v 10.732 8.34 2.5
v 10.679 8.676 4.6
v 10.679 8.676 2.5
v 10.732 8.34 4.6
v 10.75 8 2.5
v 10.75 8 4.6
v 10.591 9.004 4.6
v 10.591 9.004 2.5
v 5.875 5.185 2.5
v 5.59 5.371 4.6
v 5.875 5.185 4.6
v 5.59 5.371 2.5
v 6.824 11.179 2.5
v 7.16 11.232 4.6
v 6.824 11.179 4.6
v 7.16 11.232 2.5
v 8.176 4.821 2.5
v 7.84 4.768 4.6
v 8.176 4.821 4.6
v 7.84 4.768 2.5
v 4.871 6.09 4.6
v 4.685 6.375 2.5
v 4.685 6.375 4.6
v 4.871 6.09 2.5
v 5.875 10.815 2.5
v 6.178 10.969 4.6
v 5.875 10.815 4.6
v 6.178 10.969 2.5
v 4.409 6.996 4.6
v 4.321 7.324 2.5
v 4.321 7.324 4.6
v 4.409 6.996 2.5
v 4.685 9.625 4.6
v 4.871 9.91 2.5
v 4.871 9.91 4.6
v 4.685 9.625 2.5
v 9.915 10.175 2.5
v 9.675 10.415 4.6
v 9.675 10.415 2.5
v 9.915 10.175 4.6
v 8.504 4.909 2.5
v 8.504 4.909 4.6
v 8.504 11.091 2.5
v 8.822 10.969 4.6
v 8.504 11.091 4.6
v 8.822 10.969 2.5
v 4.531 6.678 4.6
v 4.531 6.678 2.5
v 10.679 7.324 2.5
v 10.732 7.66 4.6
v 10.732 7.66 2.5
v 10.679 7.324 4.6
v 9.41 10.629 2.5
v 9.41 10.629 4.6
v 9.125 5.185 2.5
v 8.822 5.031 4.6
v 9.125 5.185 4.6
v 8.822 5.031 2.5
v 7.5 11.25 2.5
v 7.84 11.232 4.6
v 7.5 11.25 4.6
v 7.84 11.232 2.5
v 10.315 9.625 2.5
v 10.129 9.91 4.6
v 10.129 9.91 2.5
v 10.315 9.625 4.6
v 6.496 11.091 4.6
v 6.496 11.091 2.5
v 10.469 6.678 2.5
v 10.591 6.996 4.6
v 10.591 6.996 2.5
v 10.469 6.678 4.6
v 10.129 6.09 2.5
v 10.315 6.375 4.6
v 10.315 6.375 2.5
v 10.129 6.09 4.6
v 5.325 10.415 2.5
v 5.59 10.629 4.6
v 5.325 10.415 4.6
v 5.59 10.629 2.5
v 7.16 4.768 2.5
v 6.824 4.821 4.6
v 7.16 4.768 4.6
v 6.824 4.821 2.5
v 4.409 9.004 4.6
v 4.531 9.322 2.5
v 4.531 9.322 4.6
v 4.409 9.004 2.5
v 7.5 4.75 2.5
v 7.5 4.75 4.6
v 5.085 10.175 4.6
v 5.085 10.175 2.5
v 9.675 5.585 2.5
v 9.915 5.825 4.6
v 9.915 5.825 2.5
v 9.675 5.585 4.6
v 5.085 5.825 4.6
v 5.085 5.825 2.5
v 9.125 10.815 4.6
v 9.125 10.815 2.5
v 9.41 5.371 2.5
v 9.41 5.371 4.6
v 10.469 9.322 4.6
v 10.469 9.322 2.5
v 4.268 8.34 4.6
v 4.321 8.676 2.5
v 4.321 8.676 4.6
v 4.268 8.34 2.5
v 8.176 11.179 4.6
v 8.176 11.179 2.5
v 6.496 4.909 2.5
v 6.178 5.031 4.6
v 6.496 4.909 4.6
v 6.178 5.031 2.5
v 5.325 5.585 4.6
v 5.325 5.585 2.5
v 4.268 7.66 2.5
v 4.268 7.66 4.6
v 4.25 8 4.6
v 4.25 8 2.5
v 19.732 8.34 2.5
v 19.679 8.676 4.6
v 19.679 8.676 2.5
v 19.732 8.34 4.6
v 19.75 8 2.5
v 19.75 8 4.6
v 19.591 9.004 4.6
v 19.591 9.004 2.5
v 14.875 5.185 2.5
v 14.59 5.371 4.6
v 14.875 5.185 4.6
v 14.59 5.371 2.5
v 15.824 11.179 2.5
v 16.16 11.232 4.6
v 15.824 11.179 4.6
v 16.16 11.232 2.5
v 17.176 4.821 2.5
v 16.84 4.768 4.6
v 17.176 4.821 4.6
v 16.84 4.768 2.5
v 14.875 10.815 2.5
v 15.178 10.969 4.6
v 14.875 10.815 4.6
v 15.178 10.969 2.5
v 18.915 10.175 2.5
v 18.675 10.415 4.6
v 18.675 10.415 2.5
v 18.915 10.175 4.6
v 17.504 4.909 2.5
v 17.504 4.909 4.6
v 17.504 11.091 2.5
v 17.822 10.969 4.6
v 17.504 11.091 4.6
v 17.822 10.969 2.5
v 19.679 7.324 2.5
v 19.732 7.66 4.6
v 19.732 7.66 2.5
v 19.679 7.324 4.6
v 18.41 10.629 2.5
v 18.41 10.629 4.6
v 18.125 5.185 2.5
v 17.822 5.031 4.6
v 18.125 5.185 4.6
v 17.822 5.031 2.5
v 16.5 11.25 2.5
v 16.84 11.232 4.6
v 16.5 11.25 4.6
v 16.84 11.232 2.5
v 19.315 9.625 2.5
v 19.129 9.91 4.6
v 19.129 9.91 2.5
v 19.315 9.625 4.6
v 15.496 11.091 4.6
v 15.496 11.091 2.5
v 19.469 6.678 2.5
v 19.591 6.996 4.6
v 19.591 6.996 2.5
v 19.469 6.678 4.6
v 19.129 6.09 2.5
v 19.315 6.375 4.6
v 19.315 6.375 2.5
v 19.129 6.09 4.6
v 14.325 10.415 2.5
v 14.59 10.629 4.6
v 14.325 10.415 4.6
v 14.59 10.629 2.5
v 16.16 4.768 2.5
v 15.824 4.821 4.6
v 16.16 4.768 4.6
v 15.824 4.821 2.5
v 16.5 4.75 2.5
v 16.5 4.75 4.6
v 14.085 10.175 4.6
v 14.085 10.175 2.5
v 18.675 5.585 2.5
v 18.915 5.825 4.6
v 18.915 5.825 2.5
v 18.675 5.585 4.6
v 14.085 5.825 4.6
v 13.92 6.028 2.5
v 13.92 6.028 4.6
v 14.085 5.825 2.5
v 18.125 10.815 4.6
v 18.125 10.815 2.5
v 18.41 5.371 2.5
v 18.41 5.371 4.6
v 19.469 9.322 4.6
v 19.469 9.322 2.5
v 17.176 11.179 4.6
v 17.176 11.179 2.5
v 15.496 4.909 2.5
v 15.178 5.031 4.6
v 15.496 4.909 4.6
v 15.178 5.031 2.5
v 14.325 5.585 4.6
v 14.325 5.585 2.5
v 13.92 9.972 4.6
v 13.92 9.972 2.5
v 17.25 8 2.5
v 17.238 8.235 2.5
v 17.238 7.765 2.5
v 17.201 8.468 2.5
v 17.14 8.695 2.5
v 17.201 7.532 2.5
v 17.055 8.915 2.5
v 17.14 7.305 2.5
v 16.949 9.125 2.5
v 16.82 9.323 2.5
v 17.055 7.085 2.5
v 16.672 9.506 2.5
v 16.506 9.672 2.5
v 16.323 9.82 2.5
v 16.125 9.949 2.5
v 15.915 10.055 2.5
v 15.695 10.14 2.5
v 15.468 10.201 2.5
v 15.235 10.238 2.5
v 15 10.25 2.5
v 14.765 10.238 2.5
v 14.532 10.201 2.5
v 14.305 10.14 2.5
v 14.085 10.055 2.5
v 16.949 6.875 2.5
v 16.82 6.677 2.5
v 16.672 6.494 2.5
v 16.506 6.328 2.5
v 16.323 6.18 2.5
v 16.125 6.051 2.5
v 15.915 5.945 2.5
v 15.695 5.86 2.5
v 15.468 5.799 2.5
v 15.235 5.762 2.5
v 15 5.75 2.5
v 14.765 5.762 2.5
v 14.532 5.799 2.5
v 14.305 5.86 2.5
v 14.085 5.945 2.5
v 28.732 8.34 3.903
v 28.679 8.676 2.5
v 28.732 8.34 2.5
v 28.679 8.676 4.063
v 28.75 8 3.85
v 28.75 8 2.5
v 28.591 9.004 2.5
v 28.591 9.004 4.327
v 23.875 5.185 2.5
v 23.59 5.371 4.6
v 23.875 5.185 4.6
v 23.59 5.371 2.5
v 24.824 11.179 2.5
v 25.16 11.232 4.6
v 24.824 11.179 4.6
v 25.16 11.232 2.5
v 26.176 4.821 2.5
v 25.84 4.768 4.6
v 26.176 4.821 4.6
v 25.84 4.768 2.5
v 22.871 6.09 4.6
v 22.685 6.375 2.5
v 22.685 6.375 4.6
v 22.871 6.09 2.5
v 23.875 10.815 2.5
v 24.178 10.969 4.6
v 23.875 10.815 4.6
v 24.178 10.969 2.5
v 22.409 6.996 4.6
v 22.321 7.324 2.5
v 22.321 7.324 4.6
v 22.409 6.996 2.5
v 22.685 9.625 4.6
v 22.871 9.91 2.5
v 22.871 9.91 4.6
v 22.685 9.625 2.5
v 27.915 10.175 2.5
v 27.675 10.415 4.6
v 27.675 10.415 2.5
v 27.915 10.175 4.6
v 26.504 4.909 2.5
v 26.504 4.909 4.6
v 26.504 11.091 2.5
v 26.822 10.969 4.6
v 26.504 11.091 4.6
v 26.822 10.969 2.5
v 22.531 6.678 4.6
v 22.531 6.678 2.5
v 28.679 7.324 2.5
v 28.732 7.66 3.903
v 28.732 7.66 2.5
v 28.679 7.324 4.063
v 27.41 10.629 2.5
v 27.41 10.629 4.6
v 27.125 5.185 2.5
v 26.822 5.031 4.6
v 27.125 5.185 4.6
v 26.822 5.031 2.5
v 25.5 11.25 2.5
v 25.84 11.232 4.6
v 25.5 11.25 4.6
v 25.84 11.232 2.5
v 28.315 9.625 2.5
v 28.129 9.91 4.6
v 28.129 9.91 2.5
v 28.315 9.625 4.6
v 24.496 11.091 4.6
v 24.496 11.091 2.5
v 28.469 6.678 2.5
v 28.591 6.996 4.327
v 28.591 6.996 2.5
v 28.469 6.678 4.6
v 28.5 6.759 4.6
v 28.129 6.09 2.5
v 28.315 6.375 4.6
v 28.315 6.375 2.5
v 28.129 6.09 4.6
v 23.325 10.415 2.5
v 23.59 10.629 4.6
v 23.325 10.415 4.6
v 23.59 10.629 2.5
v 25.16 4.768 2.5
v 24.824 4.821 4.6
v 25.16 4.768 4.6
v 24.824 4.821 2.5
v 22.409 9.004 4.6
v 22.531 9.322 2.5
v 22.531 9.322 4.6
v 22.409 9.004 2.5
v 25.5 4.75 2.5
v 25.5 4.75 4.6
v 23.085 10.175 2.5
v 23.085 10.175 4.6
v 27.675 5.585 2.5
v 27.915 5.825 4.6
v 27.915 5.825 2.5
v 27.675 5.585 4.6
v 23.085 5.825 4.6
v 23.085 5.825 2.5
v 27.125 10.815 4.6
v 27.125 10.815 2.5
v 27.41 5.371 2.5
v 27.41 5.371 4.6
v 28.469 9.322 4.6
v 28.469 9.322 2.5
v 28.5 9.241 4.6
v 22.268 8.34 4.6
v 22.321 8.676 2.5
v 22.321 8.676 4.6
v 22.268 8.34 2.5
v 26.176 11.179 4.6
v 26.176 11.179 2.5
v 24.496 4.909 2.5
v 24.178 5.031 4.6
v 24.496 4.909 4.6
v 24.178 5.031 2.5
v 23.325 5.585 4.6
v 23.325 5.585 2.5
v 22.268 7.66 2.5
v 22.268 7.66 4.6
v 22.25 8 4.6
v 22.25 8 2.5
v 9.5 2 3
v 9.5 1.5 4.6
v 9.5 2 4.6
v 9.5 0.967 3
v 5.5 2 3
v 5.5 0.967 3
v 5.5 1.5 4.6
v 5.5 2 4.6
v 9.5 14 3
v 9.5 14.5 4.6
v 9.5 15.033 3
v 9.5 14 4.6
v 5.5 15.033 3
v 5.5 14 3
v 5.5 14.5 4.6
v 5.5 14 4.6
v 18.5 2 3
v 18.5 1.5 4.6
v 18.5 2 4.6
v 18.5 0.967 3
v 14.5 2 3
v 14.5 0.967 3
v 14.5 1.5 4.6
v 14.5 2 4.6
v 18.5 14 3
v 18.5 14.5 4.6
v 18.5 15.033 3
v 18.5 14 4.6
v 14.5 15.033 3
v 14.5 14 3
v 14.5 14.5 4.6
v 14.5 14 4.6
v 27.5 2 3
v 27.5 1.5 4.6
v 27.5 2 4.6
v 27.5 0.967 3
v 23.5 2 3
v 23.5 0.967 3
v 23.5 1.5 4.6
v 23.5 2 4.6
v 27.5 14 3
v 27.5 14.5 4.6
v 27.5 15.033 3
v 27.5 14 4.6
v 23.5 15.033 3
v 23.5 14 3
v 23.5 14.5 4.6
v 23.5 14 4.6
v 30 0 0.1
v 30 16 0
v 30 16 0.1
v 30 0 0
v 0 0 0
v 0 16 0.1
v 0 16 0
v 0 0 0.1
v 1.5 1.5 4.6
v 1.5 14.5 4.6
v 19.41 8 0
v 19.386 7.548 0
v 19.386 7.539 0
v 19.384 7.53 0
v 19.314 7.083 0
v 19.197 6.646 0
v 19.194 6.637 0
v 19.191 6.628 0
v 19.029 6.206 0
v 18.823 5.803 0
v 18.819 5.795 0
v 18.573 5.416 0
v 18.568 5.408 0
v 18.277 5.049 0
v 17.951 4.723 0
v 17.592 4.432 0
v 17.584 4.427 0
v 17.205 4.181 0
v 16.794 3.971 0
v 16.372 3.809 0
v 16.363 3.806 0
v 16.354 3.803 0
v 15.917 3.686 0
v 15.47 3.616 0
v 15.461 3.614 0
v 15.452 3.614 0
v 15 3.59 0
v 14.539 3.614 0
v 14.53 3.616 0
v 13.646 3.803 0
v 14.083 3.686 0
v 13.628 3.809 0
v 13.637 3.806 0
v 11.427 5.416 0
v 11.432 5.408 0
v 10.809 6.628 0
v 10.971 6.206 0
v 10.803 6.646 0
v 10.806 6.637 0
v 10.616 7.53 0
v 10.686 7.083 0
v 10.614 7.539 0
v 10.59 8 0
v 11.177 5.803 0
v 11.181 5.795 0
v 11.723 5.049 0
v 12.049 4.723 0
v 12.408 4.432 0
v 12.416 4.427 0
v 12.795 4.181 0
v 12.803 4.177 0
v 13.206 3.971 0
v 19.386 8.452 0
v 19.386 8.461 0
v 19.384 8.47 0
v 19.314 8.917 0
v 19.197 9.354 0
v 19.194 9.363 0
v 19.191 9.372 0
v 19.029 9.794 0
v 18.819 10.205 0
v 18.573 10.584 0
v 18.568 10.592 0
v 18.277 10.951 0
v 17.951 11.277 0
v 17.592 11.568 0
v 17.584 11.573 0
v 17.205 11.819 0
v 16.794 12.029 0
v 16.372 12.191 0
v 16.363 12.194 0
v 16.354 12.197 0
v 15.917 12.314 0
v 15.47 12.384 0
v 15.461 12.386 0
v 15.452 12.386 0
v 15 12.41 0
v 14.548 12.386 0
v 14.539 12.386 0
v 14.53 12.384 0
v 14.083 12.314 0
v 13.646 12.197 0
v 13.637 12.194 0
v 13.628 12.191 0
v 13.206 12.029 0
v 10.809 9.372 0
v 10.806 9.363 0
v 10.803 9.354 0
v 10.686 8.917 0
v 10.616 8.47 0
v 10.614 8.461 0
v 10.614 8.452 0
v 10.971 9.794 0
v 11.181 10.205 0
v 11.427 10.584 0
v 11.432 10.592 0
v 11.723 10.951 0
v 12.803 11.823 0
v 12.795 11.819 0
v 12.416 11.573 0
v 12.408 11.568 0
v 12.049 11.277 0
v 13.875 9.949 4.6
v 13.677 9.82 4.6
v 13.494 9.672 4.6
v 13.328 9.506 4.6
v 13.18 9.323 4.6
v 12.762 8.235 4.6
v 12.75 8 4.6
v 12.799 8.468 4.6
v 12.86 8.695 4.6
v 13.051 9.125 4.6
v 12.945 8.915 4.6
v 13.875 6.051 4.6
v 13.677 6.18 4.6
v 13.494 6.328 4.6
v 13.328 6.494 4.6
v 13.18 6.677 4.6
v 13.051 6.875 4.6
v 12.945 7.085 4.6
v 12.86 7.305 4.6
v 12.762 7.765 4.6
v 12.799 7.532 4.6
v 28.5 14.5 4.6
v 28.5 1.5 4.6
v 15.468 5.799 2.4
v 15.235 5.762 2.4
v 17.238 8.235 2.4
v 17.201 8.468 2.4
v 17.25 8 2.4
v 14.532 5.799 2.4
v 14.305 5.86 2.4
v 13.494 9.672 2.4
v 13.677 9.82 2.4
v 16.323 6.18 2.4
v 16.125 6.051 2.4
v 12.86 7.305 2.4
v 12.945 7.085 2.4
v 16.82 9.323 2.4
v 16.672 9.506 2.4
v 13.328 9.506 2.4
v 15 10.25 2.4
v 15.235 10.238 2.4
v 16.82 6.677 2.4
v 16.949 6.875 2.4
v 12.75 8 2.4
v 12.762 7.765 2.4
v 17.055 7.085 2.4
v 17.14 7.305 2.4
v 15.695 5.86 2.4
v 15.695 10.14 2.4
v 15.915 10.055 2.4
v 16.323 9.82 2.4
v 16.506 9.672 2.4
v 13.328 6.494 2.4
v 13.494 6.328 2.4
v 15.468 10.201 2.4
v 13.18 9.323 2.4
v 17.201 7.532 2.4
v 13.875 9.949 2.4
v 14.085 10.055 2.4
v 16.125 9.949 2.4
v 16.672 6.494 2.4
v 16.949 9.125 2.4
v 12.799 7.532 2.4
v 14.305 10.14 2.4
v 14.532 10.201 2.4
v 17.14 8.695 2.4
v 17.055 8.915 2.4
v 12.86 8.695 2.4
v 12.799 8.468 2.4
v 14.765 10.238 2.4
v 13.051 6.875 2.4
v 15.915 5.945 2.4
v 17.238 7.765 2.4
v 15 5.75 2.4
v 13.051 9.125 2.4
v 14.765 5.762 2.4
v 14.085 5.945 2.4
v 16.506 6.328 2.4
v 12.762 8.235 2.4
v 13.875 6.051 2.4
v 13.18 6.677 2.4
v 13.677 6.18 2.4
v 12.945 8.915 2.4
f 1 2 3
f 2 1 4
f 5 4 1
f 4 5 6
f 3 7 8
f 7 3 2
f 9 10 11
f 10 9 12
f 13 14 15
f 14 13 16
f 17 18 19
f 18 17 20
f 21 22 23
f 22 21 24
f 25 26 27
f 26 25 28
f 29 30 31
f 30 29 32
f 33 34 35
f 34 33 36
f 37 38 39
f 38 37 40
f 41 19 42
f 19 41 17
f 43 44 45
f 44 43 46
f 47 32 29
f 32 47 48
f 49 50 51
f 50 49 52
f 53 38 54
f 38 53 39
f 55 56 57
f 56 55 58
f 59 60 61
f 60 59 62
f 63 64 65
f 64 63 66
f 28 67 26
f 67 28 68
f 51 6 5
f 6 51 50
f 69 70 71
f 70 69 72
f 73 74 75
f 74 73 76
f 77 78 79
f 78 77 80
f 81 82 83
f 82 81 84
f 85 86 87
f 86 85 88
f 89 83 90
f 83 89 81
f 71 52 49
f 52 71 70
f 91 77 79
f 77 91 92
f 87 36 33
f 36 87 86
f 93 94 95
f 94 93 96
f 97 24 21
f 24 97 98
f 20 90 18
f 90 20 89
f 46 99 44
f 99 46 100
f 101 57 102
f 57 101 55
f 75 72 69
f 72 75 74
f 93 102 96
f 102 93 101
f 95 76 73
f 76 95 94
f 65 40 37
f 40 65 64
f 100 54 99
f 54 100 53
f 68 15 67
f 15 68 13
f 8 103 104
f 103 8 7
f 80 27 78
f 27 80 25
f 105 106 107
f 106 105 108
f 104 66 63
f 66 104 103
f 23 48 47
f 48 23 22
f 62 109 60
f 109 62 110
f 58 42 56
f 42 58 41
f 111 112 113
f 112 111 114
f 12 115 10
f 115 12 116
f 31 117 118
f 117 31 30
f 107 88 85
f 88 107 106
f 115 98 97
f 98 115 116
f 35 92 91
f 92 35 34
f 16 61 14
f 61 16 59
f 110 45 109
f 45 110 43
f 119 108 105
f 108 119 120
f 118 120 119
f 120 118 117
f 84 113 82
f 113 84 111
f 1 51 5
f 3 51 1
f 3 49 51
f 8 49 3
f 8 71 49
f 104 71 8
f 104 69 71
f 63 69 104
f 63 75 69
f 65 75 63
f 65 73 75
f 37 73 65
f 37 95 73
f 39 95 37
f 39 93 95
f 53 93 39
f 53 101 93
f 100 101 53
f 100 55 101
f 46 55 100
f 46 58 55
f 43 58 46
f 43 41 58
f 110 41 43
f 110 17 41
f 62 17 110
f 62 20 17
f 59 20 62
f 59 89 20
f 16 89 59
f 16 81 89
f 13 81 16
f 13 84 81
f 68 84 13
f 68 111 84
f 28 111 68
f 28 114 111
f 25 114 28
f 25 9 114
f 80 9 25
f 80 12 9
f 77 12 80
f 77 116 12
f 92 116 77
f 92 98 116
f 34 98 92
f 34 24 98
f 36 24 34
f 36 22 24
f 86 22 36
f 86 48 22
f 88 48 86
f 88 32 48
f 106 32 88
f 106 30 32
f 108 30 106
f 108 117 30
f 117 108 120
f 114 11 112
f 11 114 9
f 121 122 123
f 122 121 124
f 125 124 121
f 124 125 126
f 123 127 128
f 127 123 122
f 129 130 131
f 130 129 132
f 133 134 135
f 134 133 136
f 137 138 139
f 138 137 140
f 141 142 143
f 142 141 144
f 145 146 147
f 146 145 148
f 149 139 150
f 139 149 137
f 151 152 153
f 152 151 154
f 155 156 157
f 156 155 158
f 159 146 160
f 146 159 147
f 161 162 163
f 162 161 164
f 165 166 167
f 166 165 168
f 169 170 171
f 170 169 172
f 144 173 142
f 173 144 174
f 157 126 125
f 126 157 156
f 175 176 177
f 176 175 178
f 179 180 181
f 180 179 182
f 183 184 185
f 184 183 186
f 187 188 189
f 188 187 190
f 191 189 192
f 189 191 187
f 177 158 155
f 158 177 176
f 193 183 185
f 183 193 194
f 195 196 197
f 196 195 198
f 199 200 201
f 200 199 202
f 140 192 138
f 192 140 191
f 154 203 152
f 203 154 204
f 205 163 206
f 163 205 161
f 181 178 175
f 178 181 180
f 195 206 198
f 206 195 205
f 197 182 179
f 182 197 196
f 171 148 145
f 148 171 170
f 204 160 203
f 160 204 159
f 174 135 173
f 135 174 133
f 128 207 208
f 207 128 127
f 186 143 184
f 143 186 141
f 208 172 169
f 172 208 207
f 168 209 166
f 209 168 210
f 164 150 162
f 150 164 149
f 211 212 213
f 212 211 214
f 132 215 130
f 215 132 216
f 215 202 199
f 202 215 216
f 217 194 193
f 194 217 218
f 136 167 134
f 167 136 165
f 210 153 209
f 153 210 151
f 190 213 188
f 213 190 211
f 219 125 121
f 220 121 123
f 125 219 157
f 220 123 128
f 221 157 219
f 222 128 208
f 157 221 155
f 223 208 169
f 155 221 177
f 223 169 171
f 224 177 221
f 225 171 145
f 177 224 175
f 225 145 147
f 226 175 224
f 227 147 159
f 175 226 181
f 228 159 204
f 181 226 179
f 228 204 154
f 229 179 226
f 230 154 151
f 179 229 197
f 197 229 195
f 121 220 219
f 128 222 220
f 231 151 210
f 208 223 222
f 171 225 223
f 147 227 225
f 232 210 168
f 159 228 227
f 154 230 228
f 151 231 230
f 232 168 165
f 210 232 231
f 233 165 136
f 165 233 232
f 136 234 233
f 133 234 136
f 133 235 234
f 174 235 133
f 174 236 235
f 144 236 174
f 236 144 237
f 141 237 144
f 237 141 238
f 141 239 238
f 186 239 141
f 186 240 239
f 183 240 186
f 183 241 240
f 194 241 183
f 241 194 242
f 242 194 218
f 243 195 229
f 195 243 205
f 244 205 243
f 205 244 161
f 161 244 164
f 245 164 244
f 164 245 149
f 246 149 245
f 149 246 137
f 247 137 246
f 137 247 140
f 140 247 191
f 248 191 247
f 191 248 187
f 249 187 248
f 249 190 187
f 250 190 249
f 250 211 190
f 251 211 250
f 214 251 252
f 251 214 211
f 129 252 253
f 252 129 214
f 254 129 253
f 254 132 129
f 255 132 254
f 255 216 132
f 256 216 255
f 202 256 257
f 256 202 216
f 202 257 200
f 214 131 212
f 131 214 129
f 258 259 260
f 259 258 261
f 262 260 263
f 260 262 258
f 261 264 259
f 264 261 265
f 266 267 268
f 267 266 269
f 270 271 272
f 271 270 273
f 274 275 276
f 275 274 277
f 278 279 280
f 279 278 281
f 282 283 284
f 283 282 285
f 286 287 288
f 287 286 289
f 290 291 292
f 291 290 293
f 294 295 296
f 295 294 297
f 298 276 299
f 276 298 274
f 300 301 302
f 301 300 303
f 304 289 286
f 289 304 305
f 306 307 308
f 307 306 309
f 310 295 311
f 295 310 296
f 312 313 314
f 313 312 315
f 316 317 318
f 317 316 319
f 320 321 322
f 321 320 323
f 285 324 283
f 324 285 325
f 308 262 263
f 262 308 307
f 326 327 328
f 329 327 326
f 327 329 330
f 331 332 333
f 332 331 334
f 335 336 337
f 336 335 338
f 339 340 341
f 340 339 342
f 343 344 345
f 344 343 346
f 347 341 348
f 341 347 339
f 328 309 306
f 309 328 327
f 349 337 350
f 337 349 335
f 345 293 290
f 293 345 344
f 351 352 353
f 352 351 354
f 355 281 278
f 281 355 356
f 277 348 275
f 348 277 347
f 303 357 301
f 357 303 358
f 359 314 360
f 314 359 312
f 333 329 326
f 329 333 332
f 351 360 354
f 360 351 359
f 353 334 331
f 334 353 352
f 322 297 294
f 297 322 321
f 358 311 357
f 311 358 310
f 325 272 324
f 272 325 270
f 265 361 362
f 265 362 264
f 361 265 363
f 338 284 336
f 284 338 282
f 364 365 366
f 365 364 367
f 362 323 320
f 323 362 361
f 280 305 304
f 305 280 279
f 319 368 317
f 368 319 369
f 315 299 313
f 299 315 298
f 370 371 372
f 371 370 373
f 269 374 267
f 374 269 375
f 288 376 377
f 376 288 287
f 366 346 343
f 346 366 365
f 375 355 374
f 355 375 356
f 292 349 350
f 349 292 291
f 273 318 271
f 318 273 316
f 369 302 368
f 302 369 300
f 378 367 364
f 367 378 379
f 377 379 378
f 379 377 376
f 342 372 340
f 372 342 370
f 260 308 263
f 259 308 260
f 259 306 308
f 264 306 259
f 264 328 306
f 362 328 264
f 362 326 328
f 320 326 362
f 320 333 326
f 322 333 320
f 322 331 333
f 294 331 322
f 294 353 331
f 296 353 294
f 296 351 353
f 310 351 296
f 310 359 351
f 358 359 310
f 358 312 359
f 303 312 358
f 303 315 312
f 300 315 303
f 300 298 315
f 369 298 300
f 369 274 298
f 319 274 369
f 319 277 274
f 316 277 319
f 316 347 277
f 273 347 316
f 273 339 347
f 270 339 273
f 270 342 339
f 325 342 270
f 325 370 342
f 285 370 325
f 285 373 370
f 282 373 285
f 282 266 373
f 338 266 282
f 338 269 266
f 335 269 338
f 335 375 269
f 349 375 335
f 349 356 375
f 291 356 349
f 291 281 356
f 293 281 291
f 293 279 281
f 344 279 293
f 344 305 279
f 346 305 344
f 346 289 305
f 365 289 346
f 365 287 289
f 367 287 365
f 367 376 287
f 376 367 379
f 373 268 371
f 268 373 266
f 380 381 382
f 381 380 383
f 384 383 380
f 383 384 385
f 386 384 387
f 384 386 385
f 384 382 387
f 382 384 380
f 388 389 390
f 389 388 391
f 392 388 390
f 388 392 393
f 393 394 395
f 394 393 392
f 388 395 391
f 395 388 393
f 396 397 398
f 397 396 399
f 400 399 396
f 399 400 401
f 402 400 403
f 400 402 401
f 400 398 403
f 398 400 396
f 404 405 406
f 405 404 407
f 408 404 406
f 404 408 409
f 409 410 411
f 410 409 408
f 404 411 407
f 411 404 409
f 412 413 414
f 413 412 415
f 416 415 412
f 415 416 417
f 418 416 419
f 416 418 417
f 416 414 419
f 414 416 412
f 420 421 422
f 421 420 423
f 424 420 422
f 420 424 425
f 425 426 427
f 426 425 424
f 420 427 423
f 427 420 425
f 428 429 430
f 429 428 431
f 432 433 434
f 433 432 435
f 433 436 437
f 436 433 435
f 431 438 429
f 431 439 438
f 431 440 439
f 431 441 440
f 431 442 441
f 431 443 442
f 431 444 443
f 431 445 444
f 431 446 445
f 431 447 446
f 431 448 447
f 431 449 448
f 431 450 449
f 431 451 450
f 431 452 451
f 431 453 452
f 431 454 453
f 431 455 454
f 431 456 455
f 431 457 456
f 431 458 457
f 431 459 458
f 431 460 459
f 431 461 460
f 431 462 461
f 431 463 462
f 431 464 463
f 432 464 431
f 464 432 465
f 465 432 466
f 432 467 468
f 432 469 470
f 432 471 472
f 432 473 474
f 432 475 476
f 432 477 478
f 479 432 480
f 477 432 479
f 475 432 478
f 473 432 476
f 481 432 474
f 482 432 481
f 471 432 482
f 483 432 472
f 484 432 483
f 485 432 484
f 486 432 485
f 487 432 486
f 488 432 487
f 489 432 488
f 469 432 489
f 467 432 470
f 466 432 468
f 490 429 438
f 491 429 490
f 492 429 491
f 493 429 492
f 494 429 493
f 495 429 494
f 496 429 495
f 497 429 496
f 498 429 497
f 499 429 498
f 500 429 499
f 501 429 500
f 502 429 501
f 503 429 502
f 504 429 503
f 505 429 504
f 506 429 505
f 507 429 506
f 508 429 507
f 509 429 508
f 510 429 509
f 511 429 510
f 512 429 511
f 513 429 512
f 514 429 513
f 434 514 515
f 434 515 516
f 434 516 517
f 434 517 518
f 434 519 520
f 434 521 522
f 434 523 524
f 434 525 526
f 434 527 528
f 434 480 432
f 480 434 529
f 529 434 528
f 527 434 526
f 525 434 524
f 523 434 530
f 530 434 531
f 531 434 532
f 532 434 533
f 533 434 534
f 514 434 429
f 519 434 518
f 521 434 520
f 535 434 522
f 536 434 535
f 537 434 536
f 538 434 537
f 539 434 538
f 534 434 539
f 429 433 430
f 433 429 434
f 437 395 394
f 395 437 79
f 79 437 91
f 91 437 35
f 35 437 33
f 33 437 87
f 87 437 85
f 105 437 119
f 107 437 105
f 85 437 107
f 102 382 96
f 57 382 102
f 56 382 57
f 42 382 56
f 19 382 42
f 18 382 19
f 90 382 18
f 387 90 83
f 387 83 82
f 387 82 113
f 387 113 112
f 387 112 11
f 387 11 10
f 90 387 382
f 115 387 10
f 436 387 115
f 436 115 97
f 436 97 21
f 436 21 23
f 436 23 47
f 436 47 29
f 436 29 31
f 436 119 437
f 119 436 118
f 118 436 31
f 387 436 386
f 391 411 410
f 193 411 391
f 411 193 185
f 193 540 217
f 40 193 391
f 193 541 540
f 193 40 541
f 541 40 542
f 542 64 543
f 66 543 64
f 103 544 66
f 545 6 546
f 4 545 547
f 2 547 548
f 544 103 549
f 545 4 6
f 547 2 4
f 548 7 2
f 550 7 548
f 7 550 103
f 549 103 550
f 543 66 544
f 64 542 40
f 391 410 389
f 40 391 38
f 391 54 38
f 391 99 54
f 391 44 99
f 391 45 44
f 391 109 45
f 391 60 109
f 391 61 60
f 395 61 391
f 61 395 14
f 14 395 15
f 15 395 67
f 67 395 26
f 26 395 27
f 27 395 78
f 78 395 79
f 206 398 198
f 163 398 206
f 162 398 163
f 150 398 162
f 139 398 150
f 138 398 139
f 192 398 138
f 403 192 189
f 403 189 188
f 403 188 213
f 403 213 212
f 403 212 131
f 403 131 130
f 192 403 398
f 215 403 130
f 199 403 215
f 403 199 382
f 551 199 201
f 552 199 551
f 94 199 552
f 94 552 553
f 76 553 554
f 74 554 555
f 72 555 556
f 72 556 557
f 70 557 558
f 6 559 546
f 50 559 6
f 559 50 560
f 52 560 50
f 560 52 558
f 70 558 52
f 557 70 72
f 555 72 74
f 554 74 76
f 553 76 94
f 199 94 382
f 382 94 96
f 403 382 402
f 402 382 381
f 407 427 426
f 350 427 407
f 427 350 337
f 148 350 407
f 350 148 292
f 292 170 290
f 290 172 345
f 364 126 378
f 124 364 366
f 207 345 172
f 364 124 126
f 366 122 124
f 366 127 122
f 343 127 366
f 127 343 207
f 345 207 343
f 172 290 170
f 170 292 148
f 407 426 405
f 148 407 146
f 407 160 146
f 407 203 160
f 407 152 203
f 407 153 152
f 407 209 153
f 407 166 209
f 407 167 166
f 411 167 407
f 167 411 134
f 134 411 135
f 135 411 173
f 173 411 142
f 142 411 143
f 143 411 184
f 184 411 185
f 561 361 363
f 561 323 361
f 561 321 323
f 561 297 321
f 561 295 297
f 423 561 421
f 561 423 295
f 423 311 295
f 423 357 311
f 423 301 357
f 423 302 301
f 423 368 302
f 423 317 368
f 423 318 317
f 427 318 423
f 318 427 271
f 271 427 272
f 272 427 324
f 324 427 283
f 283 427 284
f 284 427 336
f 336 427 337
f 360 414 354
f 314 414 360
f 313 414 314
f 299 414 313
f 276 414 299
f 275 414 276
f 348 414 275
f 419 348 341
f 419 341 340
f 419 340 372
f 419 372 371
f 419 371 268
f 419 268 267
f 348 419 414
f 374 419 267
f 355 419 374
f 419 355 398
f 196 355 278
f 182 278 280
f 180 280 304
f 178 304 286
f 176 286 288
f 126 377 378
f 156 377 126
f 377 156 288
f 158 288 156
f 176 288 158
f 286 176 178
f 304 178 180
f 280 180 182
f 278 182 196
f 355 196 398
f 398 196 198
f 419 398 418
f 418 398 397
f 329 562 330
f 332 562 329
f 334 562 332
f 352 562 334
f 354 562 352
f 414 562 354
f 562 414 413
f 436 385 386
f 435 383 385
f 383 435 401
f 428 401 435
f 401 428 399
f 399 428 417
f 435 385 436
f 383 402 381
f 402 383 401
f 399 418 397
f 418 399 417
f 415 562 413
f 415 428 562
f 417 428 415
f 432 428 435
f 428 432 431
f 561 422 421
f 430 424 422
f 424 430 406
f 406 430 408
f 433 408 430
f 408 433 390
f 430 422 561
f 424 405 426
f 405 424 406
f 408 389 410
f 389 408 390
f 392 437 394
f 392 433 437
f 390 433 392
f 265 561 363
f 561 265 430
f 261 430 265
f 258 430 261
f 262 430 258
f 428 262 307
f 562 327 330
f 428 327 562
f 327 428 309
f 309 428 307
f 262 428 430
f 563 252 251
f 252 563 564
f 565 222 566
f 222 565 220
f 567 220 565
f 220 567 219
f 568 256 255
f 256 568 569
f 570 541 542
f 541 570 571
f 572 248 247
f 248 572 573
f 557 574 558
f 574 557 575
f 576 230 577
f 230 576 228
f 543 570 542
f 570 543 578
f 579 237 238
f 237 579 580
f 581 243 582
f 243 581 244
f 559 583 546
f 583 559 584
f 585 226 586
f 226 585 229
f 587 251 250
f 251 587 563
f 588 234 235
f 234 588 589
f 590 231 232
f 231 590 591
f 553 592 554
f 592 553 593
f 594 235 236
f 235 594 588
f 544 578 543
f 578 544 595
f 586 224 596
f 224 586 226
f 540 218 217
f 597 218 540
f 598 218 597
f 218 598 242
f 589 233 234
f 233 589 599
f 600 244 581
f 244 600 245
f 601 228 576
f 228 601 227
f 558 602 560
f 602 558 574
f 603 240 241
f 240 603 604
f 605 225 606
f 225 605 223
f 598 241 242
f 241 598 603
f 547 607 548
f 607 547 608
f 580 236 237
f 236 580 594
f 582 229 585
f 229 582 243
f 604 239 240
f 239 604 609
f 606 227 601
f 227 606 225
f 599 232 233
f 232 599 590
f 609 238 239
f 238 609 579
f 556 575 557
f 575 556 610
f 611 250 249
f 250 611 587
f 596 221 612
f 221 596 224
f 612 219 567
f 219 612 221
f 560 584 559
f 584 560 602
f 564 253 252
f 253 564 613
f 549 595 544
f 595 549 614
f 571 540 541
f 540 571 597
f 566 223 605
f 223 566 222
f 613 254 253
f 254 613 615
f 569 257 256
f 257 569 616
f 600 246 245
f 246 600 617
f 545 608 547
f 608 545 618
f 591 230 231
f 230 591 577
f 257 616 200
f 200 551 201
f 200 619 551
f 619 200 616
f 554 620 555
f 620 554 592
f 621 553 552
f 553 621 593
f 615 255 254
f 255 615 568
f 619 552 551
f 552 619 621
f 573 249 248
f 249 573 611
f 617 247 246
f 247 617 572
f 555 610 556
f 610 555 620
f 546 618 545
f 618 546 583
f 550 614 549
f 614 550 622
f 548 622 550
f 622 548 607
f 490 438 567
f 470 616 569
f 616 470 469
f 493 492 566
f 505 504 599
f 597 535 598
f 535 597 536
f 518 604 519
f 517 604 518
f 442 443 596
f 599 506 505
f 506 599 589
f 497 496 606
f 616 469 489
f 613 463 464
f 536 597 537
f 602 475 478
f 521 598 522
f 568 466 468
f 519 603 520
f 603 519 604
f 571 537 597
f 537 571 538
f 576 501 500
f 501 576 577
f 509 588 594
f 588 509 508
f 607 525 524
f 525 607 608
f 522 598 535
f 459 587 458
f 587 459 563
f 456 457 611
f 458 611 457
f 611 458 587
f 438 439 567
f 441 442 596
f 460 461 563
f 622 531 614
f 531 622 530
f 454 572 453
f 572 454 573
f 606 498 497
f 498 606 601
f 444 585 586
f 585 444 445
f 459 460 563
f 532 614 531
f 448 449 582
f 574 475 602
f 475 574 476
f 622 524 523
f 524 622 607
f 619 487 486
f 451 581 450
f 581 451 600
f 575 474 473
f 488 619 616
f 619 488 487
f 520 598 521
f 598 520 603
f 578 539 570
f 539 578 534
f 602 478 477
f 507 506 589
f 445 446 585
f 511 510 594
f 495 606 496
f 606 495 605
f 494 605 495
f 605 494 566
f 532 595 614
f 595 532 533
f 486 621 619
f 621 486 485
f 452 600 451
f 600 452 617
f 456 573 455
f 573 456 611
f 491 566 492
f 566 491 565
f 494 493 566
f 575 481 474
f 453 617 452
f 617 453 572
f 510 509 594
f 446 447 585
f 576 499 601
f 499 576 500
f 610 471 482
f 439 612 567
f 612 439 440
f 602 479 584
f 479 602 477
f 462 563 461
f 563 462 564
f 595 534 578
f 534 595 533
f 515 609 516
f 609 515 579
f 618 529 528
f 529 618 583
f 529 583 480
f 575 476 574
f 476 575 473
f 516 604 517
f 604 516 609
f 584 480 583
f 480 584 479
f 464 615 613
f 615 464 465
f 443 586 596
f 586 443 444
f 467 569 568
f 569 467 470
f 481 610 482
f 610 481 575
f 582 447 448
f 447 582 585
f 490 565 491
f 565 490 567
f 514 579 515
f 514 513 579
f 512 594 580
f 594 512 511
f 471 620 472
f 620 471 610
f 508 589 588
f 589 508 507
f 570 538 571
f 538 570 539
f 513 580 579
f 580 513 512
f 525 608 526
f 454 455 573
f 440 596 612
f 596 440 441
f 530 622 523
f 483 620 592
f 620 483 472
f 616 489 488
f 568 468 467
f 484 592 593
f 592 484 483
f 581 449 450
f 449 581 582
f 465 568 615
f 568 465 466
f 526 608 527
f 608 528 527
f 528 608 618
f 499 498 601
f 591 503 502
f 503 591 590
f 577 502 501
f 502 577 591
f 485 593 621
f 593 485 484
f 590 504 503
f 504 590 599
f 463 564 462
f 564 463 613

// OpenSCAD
// Triple cable clamp - screw-down mount
// Holds 3 cables with zip ties, M4 screw mounting
// Adjustable cable diameter

$fn = 60;

// Parameters - adjust to your cable size
cable_d = 6;          // cable diameter (mm)
n_cables = 3;         // number of cable slots
tie_w = 4;            // zip tie slot width
tie_h = 2;            // zip tie slot height
screw_d = 4.5;        // M4 clearance hole
countersink_d = 9;    // M4 countersink diameter
countersink_h = 2.5;  // countersink depth

// Derived
wall = 3;
slot_spacing = cable_d + wall;
body_w = n_cables * slot_spacing + wall;
body_l = cable_d + 2 * wall + 2 * tie_h;
body_h = cable_d/2 + wall;
screw_offset = body_l/2;

module cable_clamp() {
    difference() {
        // Main body
        hull() {
            translate([0, 0, 0])
                cube([body_w, body_l, 0.1]);
            translate([wall/2, wall/2, body_h - wall/2])
                cube([body_w - wall, body_l - wall, 0.1]);
        }

        // Cable channels (semi-circular)
        for (i = [0:n_cables-1]) {
            x = wall + slot_spacing/2 + i * slot_spacing;
            translate([x, body_l/2, body_h])
                rotate([0, 0, 0])
                    cylinder(d=cable_d + 0.5, h=body_h + 1, center=true);
        }

        // Zip tie slots (through channels on each side of cables)
        for (i = [0:n_cables-1]) {
            x = wall + slot_spacing/2 + i * slot_spacing;
            // Front tie slot
            translate([x - tie_w/2, -0.1, wall])
                cube([tie_w, tie_h + 0.1, body_h]);
            // Rear tie slot
            translate([x - tie_w/2, body_l - tie_h, wall])
                cube([tie_w, tie_h + 0.1, body_h]);
        }

        // Screw hole (center)
        translate([body_w/2, body_l/2, -0.1])
            cylinder(d=screw_d, h=body_h + 1);
        // Countersink
        translate([body_w/2, body_l/2, -0.1])
            cylinder(d1=countersink_d, d2=screw_d, h=countersink_h);
    }
}

cable_clamp();
